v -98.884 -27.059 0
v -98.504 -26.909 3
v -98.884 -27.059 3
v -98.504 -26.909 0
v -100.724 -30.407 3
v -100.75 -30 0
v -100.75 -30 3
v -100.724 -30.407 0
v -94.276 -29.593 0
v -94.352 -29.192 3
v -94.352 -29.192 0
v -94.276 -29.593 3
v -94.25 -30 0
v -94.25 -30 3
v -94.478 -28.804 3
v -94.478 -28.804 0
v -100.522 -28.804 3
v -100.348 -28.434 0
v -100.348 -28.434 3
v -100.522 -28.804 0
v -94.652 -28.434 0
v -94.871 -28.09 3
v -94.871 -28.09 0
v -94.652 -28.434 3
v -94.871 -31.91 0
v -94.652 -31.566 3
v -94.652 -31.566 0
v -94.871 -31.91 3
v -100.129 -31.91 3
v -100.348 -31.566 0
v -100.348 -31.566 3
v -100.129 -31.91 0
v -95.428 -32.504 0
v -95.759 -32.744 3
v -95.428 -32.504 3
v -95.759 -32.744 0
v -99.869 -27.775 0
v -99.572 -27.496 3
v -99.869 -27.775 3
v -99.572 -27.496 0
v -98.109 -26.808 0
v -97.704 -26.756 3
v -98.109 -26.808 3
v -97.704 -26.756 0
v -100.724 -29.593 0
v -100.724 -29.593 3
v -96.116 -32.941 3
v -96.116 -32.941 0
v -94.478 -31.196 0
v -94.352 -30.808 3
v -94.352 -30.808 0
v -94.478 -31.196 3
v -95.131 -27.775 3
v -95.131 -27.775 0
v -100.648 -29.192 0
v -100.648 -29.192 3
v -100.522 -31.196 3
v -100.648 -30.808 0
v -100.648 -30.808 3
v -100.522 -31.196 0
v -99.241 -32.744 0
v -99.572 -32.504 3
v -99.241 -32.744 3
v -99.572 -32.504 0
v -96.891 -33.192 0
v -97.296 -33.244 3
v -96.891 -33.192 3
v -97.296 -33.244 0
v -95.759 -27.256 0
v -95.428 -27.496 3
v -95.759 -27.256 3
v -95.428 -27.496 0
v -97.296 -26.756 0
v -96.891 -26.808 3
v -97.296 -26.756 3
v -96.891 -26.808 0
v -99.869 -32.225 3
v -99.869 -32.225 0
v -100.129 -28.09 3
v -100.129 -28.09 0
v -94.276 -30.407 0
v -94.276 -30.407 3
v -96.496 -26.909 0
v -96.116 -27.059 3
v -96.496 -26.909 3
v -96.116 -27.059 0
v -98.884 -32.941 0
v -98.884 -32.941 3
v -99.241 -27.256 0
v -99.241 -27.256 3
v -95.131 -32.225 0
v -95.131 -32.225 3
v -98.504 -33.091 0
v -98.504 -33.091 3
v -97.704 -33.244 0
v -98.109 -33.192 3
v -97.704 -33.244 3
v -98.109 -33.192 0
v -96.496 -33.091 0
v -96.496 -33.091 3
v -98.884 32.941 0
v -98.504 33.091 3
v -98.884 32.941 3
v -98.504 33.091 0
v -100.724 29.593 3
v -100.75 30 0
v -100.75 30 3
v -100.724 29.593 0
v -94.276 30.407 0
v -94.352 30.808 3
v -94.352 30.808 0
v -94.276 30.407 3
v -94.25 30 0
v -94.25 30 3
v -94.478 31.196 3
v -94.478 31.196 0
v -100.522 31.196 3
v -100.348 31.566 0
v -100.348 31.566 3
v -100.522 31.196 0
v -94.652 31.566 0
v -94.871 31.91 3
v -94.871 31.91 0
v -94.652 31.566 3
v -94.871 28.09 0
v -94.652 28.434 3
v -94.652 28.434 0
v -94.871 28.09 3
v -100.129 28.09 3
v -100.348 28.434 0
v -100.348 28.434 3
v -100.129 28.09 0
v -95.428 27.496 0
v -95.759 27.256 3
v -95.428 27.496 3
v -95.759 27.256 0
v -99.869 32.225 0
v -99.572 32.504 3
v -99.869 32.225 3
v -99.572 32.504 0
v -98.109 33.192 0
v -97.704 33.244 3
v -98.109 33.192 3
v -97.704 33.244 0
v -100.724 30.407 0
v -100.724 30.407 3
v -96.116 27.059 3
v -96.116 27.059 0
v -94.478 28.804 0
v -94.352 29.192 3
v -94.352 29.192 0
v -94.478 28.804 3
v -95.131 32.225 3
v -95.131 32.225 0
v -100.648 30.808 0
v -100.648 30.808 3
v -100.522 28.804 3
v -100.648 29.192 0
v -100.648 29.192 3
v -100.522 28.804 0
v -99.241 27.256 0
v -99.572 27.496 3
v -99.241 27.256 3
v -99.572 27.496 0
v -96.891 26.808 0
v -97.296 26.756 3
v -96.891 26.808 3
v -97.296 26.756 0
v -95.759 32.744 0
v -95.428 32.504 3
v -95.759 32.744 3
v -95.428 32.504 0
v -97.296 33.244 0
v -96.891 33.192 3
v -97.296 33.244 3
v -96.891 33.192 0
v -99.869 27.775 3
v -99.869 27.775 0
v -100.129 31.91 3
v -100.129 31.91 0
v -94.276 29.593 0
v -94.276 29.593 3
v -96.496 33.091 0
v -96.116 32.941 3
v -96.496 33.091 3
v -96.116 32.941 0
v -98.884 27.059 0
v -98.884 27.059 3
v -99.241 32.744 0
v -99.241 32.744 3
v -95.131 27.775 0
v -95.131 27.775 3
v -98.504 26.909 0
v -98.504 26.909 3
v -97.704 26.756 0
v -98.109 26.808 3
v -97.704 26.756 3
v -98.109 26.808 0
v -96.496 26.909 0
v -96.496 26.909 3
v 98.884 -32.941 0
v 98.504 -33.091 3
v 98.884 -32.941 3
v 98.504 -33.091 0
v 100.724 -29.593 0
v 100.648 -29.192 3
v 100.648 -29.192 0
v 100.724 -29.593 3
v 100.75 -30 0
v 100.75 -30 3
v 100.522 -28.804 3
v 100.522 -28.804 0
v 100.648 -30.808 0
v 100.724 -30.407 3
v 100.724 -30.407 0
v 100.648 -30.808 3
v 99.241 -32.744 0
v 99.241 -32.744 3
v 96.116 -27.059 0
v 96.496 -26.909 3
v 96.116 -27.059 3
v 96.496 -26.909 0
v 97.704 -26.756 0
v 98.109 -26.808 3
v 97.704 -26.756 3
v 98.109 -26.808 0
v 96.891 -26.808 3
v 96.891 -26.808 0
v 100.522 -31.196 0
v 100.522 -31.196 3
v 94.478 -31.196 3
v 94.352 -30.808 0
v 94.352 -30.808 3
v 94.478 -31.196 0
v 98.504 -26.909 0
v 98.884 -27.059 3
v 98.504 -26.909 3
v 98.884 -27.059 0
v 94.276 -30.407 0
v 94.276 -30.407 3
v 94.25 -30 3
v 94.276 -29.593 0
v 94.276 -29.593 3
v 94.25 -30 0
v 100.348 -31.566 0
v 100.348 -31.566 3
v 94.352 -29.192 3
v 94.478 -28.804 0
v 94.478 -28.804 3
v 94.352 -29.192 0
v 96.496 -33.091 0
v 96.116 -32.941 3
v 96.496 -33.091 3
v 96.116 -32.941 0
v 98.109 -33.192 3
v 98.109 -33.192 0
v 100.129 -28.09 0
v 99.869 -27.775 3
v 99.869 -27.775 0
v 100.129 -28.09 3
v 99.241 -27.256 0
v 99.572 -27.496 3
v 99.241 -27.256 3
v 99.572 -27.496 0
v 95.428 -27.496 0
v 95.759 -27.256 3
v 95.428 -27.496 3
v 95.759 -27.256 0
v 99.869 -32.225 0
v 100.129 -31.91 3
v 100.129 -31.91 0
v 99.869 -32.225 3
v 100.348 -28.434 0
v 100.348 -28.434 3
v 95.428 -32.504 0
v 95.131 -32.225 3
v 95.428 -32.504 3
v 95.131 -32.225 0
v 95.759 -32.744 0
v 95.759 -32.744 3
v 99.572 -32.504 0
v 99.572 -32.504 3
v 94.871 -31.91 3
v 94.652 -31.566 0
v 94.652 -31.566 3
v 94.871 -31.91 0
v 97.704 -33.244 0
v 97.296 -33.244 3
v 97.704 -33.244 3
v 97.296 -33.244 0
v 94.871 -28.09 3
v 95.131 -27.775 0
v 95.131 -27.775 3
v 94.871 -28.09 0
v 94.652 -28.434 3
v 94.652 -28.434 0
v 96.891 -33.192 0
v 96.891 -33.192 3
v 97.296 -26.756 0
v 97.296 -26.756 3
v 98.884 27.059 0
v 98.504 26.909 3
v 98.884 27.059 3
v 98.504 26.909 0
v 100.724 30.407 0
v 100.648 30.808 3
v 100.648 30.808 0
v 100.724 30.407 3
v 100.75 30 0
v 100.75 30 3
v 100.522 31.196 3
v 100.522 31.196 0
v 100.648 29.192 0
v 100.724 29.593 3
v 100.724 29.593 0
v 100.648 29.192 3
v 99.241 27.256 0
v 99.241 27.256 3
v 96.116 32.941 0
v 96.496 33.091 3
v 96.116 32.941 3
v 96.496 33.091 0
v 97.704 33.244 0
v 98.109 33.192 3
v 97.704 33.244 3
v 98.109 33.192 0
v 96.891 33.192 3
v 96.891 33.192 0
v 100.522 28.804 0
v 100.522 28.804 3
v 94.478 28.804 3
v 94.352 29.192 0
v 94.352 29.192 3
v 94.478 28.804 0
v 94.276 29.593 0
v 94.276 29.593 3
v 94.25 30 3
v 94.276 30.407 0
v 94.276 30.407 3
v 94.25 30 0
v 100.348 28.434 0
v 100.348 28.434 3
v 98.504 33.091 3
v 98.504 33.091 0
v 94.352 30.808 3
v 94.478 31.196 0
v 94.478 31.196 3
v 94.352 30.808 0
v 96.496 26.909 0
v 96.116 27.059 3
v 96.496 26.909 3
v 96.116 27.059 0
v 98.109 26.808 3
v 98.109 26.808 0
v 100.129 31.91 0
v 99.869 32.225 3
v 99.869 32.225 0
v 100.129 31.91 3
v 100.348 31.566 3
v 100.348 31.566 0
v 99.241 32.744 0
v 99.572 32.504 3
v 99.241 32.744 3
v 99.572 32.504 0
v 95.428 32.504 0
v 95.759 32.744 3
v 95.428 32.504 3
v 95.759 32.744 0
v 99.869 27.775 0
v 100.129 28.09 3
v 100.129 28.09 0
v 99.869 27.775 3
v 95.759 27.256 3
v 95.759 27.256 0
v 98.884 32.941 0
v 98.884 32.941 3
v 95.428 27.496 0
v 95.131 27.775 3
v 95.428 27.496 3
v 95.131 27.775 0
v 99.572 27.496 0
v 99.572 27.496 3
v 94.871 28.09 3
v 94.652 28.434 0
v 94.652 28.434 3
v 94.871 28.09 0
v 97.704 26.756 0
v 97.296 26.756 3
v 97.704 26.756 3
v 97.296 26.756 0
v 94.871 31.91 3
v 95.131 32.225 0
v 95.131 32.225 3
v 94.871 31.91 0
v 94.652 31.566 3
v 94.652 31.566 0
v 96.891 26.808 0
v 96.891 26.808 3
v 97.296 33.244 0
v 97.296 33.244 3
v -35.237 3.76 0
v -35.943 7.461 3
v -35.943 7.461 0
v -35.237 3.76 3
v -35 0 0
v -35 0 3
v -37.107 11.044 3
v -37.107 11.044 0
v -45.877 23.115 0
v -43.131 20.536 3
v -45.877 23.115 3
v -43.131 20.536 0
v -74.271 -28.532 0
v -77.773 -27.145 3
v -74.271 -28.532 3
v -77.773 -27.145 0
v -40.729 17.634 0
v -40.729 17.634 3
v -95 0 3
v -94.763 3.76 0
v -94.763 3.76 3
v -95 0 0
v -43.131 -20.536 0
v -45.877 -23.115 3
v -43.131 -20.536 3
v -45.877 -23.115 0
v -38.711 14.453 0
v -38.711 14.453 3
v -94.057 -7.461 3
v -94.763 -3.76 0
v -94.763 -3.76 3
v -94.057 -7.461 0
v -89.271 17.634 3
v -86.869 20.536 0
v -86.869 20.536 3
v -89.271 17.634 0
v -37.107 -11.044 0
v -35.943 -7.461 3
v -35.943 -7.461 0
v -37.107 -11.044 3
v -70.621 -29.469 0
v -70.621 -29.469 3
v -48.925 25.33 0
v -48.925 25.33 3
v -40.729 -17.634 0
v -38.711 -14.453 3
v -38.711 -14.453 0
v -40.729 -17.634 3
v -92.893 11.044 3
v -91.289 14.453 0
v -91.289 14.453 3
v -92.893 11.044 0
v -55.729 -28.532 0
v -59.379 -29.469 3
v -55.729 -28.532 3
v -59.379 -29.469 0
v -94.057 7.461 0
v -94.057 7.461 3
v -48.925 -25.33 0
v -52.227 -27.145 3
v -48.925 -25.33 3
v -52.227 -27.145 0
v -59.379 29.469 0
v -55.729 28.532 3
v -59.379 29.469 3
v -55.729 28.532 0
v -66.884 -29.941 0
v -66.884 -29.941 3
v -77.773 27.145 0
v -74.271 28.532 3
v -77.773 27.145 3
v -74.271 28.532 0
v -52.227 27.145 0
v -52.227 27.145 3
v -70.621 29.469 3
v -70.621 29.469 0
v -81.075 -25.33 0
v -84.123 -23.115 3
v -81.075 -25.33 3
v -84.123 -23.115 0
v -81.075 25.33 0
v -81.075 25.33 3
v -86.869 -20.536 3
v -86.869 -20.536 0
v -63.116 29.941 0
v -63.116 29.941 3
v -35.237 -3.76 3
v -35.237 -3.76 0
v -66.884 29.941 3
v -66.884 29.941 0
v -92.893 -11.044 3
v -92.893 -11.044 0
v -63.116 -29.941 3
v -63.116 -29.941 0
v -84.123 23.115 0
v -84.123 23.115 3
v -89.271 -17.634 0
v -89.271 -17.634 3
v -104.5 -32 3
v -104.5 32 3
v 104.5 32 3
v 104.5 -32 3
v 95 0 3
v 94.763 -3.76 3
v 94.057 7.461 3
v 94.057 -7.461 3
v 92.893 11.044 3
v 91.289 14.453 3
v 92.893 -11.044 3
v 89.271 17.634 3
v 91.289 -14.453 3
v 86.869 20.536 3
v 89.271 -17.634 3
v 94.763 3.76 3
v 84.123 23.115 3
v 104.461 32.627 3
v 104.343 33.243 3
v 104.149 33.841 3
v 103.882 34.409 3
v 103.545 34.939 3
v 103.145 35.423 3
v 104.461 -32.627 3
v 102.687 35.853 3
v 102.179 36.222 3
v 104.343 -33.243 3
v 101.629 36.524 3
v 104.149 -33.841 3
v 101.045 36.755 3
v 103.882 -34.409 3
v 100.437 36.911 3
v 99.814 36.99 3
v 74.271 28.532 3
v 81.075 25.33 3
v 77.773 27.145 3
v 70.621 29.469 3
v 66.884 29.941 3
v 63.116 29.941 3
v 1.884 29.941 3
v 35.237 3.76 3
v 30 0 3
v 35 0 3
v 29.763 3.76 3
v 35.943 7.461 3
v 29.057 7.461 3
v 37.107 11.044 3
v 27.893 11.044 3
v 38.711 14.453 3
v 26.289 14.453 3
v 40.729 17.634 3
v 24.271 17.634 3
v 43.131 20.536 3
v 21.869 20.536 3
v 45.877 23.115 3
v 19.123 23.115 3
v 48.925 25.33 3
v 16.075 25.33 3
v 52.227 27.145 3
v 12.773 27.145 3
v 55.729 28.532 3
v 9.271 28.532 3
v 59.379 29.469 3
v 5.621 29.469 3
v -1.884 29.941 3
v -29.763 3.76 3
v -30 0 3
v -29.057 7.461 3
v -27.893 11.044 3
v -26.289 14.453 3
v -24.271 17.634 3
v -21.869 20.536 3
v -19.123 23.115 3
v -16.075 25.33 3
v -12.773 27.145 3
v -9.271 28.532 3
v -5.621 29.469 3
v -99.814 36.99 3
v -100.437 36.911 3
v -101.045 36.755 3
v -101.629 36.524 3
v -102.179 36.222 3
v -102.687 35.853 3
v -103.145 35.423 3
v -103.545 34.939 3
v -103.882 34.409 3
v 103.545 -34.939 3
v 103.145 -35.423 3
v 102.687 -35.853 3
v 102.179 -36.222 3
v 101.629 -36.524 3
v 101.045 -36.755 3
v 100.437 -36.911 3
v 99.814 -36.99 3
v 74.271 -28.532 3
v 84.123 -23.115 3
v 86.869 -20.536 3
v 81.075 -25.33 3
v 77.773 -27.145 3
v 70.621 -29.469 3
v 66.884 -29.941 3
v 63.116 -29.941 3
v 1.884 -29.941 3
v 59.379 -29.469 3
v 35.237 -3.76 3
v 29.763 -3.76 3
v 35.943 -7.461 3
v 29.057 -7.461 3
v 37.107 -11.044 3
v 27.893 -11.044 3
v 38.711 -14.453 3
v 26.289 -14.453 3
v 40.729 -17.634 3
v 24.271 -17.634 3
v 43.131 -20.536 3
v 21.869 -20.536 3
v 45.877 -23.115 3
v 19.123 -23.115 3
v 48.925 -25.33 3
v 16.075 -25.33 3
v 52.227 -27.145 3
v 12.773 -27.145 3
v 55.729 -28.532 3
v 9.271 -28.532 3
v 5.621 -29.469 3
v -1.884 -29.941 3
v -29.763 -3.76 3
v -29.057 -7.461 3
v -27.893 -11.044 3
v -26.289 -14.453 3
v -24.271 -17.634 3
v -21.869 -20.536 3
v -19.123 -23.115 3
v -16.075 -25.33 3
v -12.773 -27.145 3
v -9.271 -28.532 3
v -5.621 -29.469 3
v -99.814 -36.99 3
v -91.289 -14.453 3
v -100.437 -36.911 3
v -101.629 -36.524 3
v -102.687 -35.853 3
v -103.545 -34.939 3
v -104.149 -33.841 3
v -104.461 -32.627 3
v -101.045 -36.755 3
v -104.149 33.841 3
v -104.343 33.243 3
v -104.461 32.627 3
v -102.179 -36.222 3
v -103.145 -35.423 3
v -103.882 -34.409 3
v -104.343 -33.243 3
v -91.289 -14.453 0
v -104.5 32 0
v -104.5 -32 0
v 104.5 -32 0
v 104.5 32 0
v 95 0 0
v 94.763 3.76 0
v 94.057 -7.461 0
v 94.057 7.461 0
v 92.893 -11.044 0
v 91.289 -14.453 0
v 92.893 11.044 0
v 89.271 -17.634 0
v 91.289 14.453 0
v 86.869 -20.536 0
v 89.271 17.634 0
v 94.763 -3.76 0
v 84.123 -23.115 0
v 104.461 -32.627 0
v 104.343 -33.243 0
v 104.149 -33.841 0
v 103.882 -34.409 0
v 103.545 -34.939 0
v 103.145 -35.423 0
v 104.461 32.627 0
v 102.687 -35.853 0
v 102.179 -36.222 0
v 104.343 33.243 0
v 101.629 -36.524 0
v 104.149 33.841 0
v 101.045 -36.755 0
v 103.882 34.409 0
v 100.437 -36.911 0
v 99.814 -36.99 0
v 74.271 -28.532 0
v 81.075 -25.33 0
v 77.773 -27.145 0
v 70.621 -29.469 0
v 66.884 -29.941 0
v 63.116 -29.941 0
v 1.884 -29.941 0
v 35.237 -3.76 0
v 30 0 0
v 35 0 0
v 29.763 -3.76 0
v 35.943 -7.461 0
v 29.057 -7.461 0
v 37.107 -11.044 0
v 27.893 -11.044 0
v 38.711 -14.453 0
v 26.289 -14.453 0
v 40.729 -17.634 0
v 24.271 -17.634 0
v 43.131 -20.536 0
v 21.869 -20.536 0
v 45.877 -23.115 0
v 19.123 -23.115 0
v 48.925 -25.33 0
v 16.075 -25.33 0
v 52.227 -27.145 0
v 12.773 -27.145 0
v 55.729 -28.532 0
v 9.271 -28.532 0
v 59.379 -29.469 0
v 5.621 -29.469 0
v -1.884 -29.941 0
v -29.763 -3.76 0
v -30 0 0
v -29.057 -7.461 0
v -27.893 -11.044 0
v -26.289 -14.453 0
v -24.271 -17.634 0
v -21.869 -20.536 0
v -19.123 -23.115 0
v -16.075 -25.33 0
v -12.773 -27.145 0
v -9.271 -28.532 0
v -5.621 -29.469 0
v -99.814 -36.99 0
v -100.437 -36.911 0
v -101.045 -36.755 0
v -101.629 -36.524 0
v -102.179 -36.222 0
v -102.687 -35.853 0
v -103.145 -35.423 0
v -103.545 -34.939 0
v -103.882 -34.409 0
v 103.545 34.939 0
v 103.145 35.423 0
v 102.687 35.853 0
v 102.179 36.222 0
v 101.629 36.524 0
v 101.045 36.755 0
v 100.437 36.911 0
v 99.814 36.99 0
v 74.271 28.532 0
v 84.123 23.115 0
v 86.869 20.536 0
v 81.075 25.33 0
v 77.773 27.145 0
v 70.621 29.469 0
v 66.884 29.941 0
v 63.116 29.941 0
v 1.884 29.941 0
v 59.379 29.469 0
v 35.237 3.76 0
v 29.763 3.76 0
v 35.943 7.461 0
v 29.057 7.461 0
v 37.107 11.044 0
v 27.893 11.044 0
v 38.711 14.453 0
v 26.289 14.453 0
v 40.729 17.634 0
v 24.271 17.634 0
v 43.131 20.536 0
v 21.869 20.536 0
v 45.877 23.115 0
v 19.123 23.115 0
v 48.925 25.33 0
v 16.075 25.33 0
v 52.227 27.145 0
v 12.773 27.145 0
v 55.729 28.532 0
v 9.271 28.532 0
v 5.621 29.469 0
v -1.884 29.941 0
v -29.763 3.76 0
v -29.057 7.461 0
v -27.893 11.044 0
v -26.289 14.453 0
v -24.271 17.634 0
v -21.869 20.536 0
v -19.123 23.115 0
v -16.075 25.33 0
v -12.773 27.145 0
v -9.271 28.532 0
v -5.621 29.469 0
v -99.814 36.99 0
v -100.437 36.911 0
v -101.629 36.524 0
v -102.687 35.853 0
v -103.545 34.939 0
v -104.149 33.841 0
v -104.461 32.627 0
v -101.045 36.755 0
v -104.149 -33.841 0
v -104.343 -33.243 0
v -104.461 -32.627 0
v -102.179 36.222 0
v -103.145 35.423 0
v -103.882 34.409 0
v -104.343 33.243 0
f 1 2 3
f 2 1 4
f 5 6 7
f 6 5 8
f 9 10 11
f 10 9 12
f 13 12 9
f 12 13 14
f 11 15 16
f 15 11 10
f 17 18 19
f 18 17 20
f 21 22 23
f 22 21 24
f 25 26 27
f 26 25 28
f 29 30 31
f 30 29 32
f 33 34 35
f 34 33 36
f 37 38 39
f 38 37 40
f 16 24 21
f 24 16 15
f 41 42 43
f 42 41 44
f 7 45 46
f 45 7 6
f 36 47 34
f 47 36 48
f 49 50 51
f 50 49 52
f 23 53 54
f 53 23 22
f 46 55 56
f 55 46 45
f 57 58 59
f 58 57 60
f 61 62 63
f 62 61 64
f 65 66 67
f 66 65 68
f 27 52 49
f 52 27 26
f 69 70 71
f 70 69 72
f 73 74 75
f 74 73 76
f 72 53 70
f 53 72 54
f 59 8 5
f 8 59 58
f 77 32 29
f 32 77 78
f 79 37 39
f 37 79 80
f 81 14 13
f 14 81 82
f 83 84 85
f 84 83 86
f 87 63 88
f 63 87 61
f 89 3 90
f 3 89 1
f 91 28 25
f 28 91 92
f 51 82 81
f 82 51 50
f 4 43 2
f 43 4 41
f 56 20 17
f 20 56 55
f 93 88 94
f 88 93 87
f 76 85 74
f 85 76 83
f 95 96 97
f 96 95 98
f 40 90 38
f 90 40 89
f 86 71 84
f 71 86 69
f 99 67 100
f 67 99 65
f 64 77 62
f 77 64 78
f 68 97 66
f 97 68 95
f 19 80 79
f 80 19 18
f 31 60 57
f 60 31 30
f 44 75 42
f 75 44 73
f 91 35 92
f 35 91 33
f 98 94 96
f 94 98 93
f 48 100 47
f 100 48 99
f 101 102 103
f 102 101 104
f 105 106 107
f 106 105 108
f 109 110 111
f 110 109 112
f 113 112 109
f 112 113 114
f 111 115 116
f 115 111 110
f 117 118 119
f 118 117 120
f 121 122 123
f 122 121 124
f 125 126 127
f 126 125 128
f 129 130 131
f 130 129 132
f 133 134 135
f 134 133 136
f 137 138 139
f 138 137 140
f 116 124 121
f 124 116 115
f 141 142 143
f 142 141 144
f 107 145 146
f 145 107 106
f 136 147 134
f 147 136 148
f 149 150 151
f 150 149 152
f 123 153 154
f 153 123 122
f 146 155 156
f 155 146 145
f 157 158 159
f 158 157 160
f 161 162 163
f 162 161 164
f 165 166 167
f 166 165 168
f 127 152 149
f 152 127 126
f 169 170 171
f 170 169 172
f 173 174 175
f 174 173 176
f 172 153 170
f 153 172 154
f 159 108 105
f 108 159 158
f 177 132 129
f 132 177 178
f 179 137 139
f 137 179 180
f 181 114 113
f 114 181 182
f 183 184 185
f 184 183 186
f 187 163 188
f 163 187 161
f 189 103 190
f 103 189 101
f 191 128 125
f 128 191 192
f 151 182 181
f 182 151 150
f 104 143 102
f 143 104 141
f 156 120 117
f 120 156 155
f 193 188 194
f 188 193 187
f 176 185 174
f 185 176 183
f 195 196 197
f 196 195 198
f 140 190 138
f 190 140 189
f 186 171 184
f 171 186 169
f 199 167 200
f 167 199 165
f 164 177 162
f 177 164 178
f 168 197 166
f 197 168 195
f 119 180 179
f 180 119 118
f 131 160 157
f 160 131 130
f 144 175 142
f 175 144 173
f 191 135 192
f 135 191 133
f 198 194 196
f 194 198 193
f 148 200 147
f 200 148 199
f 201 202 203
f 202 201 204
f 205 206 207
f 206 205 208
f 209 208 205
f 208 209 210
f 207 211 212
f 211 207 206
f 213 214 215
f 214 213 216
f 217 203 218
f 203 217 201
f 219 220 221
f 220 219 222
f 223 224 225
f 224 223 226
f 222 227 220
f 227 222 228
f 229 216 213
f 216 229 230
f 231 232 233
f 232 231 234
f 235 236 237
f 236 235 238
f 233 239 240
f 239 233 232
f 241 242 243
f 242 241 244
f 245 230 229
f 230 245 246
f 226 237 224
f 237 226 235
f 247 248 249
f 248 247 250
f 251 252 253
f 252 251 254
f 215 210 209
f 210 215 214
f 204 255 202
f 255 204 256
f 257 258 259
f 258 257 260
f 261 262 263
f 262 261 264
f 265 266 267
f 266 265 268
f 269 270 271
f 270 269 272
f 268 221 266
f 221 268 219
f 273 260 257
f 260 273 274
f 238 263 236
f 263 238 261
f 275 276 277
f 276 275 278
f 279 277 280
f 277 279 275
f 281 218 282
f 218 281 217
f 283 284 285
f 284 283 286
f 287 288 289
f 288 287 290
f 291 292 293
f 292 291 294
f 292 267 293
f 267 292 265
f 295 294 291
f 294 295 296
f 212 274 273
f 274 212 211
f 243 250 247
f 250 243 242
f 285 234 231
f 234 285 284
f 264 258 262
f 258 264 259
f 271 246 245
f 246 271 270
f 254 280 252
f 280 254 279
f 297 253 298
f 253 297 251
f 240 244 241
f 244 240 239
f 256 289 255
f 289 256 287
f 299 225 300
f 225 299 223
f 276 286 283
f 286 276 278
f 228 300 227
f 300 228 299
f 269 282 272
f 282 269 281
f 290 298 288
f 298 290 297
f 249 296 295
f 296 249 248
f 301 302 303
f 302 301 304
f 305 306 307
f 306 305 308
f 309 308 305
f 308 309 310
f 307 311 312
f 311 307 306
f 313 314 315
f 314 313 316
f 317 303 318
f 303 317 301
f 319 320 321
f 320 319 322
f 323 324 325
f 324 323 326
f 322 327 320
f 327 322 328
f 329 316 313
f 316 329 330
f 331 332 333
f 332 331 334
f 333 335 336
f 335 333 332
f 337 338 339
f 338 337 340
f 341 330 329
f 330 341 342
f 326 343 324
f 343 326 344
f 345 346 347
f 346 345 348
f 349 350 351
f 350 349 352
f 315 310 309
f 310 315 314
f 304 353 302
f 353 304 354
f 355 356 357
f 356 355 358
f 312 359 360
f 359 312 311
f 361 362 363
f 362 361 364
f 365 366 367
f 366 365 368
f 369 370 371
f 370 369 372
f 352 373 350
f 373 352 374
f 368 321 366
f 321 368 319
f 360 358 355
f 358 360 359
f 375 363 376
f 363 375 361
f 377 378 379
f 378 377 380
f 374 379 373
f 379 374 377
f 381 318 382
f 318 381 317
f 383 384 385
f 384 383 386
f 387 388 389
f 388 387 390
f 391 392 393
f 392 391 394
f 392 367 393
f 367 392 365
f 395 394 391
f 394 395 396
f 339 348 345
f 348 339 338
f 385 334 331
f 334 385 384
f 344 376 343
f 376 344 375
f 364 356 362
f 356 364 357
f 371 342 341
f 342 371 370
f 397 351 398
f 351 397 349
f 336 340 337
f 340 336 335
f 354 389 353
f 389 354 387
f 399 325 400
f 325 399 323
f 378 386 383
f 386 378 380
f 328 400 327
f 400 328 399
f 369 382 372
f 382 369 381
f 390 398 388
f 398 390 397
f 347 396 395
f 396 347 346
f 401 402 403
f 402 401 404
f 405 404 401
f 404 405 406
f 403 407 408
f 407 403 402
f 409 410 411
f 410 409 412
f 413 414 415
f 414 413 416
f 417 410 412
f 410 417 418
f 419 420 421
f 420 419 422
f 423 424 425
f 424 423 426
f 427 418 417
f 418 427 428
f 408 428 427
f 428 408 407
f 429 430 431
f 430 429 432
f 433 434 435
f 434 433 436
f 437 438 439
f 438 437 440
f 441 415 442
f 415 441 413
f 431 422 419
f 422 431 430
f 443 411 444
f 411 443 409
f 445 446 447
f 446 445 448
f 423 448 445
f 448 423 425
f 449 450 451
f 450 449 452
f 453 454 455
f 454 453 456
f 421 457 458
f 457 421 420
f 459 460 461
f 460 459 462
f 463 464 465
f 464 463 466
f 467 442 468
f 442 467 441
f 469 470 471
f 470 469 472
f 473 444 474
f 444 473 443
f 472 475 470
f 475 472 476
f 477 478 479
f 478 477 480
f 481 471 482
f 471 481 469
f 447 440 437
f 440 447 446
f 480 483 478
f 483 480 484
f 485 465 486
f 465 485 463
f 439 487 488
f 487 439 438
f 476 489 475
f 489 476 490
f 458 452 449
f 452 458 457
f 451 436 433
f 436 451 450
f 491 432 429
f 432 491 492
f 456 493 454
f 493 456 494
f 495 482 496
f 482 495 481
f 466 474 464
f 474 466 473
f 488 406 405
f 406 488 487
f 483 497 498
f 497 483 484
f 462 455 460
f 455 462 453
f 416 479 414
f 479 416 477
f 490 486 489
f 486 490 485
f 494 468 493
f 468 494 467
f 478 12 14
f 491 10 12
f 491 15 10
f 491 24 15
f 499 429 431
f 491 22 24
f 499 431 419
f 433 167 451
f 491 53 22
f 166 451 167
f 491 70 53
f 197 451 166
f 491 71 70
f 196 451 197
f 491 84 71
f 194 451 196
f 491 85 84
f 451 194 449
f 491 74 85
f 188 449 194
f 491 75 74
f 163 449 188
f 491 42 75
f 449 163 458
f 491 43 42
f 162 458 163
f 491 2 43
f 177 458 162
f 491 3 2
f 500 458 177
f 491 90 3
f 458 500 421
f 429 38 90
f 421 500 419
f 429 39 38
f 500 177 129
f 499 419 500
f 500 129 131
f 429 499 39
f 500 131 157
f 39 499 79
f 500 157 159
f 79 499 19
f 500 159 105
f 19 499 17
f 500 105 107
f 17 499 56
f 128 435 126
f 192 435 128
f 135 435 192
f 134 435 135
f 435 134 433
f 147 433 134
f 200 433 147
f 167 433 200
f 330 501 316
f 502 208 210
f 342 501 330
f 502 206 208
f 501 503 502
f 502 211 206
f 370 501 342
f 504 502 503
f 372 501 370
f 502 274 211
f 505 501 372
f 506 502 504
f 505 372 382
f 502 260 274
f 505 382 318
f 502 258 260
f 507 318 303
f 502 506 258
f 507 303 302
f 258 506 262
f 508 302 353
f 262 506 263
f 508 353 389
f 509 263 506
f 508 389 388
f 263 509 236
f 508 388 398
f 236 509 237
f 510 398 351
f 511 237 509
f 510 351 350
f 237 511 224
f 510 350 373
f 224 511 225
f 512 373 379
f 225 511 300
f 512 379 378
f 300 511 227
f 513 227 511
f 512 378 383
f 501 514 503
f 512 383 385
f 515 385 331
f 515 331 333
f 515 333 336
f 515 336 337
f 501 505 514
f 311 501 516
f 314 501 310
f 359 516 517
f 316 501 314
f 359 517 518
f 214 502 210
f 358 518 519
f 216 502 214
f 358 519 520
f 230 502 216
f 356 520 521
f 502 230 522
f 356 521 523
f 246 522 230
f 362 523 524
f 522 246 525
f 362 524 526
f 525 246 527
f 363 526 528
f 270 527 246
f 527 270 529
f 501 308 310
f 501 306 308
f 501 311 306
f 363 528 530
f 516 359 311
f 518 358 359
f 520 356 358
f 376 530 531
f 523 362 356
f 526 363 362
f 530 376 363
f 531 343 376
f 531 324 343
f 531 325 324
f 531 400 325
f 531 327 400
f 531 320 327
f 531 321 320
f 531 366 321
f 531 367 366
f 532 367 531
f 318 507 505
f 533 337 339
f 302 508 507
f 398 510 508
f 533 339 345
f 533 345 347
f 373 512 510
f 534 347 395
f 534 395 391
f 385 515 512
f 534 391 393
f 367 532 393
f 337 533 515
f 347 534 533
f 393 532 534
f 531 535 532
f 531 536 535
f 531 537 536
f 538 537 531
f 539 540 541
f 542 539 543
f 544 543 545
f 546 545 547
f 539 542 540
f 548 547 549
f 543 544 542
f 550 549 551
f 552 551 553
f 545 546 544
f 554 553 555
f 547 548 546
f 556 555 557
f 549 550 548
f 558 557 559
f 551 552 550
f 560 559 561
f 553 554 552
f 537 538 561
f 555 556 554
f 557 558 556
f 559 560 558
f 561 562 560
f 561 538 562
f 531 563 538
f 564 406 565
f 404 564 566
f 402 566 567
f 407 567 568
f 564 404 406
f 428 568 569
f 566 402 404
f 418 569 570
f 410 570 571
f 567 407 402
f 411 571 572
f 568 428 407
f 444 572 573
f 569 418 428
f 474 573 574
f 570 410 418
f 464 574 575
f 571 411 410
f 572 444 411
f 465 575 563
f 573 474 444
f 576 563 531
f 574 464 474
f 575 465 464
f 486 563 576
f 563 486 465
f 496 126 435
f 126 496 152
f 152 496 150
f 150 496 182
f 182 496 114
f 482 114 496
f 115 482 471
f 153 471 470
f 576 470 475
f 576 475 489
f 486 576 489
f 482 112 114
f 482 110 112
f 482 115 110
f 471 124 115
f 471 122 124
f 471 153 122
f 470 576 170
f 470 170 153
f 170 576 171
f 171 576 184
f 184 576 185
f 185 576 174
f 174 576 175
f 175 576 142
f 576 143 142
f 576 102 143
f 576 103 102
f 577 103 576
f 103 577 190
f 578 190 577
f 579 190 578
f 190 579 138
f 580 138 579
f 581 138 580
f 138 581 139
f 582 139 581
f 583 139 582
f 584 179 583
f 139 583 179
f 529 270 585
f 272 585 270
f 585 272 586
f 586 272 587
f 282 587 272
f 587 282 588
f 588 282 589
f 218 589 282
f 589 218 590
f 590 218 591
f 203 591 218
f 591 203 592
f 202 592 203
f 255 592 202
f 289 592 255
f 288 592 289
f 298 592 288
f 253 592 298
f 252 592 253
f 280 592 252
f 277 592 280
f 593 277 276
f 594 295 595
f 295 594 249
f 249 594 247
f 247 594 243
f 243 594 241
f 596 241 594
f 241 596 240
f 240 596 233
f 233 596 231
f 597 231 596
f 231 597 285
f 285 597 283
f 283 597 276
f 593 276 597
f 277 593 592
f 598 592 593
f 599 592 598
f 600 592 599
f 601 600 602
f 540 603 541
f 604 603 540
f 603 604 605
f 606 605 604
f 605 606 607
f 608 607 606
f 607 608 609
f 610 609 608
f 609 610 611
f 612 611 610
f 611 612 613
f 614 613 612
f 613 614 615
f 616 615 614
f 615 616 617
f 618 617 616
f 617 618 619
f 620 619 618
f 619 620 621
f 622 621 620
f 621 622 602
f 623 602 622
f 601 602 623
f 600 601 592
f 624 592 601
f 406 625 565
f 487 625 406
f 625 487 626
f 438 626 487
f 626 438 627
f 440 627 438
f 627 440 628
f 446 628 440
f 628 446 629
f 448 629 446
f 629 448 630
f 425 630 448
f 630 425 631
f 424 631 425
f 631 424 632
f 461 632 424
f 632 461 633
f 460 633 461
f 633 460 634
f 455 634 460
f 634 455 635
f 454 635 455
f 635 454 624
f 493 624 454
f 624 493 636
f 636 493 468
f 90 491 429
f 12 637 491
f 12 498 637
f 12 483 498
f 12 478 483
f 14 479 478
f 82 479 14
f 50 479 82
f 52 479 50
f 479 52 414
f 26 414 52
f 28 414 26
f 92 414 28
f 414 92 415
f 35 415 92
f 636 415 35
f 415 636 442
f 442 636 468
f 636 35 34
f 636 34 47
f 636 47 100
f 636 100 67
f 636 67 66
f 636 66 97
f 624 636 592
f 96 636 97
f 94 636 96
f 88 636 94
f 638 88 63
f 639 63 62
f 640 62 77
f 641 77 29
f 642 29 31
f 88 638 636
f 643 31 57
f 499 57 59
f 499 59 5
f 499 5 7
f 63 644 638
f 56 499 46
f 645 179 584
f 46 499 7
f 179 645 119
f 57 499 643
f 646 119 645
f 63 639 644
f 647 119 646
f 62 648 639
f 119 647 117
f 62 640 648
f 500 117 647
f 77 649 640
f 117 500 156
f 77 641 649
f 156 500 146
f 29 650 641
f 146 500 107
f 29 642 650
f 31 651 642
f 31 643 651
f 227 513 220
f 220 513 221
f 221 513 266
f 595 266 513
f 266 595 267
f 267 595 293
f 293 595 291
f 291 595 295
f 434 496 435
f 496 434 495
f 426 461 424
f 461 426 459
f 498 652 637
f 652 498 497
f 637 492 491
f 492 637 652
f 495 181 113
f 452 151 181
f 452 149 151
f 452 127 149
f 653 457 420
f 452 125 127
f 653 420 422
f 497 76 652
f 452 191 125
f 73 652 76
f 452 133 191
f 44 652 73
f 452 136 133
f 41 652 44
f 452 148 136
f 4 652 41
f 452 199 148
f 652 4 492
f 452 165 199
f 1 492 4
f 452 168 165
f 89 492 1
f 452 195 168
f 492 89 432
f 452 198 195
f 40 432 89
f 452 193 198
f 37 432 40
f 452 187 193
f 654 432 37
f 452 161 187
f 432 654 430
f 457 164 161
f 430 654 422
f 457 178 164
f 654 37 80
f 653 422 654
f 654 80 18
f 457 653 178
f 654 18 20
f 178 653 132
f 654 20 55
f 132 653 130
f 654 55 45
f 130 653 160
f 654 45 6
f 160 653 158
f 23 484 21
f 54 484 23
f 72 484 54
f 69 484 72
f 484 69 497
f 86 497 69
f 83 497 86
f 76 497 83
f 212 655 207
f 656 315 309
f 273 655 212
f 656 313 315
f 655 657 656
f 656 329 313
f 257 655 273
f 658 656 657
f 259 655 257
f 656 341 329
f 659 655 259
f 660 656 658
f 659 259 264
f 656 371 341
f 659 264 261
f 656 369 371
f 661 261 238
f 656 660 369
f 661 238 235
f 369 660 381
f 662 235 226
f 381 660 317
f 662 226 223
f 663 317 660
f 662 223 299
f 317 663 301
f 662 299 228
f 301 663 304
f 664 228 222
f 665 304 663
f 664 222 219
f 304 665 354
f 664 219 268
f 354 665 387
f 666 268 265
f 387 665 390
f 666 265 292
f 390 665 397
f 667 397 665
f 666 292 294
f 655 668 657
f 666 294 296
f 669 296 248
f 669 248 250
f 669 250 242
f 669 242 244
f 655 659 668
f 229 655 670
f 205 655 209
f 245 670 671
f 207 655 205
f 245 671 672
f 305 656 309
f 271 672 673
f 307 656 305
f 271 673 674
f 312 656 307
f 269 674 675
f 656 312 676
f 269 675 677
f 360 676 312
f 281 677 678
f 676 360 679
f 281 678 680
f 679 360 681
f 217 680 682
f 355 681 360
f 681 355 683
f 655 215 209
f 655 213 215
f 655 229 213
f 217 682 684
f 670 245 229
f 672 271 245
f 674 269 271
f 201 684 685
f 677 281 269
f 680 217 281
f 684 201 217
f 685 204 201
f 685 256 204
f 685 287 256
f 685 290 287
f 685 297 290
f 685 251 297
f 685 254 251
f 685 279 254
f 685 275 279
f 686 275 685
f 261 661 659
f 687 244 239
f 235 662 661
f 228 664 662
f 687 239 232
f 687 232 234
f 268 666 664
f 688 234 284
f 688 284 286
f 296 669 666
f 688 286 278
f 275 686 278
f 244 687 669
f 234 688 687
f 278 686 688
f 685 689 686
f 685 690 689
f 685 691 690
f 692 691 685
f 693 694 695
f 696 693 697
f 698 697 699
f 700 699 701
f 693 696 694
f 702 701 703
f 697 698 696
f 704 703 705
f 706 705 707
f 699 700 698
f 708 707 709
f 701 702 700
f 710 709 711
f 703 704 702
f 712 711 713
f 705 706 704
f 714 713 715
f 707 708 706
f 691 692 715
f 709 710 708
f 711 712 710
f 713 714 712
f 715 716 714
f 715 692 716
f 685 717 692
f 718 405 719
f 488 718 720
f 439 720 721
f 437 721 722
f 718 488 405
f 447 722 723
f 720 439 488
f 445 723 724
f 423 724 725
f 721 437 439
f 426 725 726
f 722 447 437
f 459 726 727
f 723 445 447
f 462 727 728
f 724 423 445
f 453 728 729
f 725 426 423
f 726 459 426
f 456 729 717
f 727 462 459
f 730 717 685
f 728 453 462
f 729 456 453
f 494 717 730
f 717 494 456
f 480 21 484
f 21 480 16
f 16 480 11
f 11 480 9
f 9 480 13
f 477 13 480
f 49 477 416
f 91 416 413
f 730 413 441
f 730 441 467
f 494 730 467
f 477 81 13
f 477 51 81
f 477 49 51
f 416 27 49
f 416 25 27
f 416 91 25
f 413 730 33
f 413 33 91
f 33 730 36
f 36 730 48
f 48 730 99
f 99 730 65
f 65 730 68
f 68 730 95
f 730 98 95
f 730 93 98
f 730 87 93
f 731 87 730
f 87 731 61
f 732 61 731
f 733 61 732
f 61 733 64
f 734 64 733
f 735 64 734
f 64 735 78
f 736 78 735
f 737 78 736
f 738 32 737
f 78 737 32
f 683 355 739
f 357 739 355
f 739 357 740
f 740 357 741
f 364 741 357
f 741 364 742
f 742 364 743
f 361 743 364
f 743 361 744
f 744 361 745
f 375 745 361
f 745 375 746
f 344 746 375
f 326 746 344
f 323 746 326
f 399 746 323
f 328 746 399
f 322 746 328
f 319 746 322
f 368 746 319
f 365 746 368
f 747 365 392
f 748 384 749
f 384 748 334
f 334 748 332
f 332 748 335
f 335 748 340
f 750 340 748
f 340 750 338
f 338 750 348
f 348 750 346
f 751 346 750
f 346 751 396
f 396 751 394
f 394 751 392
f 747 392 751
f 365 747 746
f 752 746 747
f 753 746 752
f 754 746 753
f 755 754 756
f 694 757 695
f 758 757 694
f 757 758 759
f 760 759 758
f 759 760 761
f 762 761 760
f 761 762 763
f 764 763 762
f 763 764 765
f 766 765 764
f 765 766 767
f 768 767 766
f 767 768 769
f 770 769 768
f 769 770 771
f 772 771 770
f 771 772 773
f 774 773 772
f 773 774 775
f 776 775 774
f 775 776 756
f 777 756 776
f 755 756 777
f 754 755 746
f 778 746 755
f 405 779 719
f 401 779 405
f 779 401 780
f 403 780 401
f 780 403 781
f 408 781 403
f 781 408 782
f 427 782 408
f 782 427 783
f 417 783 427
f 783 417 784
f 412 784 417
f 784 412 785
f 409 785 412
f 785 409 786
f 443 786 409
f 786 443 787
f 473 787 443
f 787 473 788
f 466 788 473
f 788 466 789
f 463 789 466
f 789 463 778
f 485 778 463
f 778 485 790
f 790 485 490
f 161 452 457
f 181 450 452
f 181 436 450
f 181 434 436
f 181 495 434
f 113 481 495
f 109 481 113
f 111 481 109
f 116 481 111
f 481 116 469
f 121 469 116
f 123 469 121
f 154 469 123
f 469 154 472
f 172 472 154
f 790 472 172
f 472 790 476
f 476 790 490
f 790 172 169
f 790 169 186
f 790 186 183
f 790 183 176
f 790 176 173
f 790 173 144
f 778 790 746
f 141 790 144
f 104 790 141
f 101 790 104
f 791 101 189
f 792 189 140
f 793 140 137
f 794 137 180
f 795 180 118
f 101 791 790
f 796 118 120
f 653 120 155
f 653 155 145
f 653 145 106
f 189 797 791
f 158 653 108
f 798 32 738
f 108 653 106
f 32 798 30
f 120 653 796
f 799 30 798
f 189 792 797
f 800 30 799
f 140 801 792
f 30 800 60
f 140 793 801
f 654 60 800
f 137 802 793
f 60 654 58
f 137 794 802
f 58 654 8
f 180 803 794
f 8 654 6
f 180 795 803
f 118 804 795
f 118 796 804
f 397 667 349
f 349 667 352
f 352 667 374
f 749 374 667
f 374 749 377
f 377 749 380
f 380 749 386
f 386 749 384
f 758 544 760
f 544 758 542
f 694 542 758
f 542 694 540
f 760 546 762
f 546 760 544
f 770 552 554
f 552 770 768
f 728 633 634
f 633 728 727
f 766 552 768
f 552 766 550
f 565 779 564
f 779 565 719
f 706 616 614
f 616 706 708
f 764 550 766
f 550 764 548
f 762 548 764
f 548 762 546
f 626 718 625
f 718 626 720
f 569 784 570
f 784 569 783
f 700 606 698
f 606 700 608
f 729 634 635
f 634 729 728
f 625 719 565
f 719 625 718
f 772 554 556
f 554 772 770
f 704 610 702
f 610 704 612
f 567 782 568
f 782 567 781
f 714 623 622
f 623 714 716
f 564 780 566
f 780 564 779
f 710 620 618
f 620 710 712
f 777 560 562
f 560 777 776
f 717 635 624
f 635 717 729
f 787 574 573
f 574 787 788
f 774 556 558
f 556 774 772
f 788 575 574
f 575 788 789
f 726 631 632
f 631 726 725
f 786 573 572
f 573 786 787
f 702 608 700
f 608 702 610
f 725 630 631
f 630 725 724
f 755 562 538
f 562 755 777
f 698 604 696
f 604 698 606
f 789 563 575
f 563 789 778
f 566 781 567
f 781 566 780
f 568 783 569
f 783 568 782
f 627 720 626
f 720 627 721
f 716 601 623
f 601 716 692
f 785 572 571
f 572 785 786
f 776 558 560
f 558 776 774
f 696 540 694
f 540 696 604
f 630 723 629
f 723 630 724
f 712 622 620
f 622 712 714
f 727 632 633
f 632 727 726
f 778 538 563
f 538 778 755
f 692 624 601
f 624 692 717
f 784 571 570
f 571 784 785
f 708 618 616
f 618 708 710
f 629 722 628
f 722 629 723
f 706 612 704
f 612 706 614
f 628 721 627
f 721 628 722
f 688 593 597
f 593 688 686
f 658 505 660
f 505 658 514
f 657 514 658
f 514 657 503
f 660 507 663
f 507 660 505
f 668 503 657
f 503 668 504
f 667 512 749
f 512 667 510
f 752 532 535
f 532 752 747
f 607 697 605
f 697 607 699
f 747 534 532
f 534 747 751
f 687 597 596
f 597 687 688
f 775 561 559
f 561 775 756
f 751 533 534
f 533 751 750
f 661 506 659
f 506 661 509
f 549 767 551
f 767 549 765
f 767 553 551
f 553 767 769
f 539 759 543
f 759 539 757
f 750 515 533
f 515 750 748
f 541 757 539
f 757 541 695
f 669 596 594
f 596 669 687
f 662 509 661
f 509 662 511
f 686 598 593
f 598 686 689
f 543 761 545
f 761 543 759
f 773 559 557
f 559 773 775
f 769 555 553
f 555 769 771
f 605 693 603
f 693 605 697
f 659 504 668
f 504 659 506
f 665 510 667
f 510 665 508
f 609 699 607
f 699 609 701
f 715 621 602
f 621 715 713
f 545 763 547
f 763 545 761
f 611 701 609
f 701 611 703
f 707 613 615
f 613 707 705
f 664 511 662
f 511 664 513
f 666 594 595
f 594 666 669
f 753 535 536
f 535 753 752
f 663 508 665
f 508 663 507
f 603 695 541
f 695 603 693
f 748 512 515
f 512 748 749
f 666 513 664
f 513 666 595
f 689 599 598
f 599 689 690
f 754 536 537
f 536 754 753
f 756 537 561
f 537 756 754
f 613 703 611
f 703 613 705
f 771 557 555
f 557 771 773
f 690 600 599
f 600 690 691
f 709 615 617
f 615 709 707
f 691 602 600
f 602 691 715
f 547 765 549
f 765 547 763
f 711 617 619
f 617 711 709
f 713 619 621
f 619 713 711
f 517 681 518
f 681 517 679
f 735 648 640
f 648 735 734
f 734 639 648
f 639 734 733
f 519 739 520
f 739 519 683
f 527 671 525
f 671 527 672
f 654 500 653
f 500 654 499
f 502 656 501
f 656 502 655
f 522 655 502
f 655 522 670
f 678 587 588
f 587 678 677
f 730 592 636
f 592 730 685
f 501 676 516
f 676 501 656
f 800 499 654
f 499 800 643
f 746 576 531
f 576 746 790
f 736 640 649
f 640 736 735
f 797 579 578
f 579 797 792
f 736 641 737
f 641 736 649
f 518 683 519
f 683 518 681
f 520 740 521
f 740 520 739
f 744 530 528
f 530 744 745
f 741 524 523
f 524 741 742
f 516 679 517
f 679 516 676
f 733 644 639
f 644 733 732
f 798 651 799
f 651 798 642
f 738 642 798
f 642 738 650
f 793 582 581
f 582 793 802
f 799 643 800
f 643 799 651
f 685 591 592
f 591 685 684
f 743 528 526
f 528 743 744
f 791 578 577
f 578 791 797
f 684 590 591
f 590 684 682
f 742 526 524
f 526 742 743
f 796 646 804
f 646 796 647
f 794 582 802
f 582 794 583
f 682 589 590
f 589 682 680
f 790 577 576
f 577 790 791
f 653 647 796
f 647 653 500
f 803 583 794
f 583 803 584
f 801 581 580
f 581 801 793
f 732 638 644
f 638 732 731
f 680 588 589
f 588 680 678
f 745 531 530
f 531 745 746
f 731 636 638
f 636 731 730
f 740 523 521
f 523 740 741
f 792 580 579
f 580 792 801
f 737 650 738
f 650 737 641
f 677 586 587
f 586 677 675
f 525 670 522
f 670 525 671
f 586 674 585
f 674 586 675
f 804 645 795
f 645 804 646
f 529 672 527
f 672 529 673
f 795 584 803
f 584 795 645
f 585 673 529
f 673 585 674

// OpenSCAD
$fn = 50;

difference() {
	union() {
		hull() {
			translate(v = [-99.5, 32.0, 0]) {
				cylinder(h = 3, r = 5);
			}
			translate(v = [99.5, 32.0, 0]) {
				cylinder(h = 3, r = 5);
			}
			translate(v = [-99.5, -32.0, 0]) {
				cylinder(h = 3, r = 5);
			}
			translate(v = [99.5, -32.0, 0]) {
				cylinder(h = 3, r = 5);
			}
		}
	}
	union() {
		translate(v = [-97.5, -30.0, -100.0]) {
			cylinder(h = 200, r = 3.25);
		}
		translate(v = [-97.5, 30.0, -100.0]) {
			cylinder(h = 200, r = 3.25);
		}
		translate(v = [97.5, -30.0, -100.0]) {
			cylinder(h = 200, r = 3.25);
		}
		translate(v = [97.5, 30.0, -100.0]) {
			cylinder(h = 200, r = 3.25);
		}
		translate(v = [-97.5, -30.0, -100.0]) {
			cylinder(h = 200, r = 1.8);
		}
		translate(v = [-97.5, 30.0, -100.0]) {
			cylinder(h = 200, r = 1.8);
		}
		translate(v = [97.5, -30.0, -100.0]) {
			cylinder(h = 200, r = 1.8);
		}
		translate(v = [97.5, 30.0, -100.0]) {
			cylinder(h = 200, r = 1.8);
		}
		translate(v = [-65.0, 0, 0.0]) {
			cylinder(h = 3, r = 30.0);
		}
		cylinder(h = 3, r = 30.0);
		translate(v = [65.0, 0, 0.0]) {
			cylinder(h = 3, r = 30.0);
		}
	}
}
